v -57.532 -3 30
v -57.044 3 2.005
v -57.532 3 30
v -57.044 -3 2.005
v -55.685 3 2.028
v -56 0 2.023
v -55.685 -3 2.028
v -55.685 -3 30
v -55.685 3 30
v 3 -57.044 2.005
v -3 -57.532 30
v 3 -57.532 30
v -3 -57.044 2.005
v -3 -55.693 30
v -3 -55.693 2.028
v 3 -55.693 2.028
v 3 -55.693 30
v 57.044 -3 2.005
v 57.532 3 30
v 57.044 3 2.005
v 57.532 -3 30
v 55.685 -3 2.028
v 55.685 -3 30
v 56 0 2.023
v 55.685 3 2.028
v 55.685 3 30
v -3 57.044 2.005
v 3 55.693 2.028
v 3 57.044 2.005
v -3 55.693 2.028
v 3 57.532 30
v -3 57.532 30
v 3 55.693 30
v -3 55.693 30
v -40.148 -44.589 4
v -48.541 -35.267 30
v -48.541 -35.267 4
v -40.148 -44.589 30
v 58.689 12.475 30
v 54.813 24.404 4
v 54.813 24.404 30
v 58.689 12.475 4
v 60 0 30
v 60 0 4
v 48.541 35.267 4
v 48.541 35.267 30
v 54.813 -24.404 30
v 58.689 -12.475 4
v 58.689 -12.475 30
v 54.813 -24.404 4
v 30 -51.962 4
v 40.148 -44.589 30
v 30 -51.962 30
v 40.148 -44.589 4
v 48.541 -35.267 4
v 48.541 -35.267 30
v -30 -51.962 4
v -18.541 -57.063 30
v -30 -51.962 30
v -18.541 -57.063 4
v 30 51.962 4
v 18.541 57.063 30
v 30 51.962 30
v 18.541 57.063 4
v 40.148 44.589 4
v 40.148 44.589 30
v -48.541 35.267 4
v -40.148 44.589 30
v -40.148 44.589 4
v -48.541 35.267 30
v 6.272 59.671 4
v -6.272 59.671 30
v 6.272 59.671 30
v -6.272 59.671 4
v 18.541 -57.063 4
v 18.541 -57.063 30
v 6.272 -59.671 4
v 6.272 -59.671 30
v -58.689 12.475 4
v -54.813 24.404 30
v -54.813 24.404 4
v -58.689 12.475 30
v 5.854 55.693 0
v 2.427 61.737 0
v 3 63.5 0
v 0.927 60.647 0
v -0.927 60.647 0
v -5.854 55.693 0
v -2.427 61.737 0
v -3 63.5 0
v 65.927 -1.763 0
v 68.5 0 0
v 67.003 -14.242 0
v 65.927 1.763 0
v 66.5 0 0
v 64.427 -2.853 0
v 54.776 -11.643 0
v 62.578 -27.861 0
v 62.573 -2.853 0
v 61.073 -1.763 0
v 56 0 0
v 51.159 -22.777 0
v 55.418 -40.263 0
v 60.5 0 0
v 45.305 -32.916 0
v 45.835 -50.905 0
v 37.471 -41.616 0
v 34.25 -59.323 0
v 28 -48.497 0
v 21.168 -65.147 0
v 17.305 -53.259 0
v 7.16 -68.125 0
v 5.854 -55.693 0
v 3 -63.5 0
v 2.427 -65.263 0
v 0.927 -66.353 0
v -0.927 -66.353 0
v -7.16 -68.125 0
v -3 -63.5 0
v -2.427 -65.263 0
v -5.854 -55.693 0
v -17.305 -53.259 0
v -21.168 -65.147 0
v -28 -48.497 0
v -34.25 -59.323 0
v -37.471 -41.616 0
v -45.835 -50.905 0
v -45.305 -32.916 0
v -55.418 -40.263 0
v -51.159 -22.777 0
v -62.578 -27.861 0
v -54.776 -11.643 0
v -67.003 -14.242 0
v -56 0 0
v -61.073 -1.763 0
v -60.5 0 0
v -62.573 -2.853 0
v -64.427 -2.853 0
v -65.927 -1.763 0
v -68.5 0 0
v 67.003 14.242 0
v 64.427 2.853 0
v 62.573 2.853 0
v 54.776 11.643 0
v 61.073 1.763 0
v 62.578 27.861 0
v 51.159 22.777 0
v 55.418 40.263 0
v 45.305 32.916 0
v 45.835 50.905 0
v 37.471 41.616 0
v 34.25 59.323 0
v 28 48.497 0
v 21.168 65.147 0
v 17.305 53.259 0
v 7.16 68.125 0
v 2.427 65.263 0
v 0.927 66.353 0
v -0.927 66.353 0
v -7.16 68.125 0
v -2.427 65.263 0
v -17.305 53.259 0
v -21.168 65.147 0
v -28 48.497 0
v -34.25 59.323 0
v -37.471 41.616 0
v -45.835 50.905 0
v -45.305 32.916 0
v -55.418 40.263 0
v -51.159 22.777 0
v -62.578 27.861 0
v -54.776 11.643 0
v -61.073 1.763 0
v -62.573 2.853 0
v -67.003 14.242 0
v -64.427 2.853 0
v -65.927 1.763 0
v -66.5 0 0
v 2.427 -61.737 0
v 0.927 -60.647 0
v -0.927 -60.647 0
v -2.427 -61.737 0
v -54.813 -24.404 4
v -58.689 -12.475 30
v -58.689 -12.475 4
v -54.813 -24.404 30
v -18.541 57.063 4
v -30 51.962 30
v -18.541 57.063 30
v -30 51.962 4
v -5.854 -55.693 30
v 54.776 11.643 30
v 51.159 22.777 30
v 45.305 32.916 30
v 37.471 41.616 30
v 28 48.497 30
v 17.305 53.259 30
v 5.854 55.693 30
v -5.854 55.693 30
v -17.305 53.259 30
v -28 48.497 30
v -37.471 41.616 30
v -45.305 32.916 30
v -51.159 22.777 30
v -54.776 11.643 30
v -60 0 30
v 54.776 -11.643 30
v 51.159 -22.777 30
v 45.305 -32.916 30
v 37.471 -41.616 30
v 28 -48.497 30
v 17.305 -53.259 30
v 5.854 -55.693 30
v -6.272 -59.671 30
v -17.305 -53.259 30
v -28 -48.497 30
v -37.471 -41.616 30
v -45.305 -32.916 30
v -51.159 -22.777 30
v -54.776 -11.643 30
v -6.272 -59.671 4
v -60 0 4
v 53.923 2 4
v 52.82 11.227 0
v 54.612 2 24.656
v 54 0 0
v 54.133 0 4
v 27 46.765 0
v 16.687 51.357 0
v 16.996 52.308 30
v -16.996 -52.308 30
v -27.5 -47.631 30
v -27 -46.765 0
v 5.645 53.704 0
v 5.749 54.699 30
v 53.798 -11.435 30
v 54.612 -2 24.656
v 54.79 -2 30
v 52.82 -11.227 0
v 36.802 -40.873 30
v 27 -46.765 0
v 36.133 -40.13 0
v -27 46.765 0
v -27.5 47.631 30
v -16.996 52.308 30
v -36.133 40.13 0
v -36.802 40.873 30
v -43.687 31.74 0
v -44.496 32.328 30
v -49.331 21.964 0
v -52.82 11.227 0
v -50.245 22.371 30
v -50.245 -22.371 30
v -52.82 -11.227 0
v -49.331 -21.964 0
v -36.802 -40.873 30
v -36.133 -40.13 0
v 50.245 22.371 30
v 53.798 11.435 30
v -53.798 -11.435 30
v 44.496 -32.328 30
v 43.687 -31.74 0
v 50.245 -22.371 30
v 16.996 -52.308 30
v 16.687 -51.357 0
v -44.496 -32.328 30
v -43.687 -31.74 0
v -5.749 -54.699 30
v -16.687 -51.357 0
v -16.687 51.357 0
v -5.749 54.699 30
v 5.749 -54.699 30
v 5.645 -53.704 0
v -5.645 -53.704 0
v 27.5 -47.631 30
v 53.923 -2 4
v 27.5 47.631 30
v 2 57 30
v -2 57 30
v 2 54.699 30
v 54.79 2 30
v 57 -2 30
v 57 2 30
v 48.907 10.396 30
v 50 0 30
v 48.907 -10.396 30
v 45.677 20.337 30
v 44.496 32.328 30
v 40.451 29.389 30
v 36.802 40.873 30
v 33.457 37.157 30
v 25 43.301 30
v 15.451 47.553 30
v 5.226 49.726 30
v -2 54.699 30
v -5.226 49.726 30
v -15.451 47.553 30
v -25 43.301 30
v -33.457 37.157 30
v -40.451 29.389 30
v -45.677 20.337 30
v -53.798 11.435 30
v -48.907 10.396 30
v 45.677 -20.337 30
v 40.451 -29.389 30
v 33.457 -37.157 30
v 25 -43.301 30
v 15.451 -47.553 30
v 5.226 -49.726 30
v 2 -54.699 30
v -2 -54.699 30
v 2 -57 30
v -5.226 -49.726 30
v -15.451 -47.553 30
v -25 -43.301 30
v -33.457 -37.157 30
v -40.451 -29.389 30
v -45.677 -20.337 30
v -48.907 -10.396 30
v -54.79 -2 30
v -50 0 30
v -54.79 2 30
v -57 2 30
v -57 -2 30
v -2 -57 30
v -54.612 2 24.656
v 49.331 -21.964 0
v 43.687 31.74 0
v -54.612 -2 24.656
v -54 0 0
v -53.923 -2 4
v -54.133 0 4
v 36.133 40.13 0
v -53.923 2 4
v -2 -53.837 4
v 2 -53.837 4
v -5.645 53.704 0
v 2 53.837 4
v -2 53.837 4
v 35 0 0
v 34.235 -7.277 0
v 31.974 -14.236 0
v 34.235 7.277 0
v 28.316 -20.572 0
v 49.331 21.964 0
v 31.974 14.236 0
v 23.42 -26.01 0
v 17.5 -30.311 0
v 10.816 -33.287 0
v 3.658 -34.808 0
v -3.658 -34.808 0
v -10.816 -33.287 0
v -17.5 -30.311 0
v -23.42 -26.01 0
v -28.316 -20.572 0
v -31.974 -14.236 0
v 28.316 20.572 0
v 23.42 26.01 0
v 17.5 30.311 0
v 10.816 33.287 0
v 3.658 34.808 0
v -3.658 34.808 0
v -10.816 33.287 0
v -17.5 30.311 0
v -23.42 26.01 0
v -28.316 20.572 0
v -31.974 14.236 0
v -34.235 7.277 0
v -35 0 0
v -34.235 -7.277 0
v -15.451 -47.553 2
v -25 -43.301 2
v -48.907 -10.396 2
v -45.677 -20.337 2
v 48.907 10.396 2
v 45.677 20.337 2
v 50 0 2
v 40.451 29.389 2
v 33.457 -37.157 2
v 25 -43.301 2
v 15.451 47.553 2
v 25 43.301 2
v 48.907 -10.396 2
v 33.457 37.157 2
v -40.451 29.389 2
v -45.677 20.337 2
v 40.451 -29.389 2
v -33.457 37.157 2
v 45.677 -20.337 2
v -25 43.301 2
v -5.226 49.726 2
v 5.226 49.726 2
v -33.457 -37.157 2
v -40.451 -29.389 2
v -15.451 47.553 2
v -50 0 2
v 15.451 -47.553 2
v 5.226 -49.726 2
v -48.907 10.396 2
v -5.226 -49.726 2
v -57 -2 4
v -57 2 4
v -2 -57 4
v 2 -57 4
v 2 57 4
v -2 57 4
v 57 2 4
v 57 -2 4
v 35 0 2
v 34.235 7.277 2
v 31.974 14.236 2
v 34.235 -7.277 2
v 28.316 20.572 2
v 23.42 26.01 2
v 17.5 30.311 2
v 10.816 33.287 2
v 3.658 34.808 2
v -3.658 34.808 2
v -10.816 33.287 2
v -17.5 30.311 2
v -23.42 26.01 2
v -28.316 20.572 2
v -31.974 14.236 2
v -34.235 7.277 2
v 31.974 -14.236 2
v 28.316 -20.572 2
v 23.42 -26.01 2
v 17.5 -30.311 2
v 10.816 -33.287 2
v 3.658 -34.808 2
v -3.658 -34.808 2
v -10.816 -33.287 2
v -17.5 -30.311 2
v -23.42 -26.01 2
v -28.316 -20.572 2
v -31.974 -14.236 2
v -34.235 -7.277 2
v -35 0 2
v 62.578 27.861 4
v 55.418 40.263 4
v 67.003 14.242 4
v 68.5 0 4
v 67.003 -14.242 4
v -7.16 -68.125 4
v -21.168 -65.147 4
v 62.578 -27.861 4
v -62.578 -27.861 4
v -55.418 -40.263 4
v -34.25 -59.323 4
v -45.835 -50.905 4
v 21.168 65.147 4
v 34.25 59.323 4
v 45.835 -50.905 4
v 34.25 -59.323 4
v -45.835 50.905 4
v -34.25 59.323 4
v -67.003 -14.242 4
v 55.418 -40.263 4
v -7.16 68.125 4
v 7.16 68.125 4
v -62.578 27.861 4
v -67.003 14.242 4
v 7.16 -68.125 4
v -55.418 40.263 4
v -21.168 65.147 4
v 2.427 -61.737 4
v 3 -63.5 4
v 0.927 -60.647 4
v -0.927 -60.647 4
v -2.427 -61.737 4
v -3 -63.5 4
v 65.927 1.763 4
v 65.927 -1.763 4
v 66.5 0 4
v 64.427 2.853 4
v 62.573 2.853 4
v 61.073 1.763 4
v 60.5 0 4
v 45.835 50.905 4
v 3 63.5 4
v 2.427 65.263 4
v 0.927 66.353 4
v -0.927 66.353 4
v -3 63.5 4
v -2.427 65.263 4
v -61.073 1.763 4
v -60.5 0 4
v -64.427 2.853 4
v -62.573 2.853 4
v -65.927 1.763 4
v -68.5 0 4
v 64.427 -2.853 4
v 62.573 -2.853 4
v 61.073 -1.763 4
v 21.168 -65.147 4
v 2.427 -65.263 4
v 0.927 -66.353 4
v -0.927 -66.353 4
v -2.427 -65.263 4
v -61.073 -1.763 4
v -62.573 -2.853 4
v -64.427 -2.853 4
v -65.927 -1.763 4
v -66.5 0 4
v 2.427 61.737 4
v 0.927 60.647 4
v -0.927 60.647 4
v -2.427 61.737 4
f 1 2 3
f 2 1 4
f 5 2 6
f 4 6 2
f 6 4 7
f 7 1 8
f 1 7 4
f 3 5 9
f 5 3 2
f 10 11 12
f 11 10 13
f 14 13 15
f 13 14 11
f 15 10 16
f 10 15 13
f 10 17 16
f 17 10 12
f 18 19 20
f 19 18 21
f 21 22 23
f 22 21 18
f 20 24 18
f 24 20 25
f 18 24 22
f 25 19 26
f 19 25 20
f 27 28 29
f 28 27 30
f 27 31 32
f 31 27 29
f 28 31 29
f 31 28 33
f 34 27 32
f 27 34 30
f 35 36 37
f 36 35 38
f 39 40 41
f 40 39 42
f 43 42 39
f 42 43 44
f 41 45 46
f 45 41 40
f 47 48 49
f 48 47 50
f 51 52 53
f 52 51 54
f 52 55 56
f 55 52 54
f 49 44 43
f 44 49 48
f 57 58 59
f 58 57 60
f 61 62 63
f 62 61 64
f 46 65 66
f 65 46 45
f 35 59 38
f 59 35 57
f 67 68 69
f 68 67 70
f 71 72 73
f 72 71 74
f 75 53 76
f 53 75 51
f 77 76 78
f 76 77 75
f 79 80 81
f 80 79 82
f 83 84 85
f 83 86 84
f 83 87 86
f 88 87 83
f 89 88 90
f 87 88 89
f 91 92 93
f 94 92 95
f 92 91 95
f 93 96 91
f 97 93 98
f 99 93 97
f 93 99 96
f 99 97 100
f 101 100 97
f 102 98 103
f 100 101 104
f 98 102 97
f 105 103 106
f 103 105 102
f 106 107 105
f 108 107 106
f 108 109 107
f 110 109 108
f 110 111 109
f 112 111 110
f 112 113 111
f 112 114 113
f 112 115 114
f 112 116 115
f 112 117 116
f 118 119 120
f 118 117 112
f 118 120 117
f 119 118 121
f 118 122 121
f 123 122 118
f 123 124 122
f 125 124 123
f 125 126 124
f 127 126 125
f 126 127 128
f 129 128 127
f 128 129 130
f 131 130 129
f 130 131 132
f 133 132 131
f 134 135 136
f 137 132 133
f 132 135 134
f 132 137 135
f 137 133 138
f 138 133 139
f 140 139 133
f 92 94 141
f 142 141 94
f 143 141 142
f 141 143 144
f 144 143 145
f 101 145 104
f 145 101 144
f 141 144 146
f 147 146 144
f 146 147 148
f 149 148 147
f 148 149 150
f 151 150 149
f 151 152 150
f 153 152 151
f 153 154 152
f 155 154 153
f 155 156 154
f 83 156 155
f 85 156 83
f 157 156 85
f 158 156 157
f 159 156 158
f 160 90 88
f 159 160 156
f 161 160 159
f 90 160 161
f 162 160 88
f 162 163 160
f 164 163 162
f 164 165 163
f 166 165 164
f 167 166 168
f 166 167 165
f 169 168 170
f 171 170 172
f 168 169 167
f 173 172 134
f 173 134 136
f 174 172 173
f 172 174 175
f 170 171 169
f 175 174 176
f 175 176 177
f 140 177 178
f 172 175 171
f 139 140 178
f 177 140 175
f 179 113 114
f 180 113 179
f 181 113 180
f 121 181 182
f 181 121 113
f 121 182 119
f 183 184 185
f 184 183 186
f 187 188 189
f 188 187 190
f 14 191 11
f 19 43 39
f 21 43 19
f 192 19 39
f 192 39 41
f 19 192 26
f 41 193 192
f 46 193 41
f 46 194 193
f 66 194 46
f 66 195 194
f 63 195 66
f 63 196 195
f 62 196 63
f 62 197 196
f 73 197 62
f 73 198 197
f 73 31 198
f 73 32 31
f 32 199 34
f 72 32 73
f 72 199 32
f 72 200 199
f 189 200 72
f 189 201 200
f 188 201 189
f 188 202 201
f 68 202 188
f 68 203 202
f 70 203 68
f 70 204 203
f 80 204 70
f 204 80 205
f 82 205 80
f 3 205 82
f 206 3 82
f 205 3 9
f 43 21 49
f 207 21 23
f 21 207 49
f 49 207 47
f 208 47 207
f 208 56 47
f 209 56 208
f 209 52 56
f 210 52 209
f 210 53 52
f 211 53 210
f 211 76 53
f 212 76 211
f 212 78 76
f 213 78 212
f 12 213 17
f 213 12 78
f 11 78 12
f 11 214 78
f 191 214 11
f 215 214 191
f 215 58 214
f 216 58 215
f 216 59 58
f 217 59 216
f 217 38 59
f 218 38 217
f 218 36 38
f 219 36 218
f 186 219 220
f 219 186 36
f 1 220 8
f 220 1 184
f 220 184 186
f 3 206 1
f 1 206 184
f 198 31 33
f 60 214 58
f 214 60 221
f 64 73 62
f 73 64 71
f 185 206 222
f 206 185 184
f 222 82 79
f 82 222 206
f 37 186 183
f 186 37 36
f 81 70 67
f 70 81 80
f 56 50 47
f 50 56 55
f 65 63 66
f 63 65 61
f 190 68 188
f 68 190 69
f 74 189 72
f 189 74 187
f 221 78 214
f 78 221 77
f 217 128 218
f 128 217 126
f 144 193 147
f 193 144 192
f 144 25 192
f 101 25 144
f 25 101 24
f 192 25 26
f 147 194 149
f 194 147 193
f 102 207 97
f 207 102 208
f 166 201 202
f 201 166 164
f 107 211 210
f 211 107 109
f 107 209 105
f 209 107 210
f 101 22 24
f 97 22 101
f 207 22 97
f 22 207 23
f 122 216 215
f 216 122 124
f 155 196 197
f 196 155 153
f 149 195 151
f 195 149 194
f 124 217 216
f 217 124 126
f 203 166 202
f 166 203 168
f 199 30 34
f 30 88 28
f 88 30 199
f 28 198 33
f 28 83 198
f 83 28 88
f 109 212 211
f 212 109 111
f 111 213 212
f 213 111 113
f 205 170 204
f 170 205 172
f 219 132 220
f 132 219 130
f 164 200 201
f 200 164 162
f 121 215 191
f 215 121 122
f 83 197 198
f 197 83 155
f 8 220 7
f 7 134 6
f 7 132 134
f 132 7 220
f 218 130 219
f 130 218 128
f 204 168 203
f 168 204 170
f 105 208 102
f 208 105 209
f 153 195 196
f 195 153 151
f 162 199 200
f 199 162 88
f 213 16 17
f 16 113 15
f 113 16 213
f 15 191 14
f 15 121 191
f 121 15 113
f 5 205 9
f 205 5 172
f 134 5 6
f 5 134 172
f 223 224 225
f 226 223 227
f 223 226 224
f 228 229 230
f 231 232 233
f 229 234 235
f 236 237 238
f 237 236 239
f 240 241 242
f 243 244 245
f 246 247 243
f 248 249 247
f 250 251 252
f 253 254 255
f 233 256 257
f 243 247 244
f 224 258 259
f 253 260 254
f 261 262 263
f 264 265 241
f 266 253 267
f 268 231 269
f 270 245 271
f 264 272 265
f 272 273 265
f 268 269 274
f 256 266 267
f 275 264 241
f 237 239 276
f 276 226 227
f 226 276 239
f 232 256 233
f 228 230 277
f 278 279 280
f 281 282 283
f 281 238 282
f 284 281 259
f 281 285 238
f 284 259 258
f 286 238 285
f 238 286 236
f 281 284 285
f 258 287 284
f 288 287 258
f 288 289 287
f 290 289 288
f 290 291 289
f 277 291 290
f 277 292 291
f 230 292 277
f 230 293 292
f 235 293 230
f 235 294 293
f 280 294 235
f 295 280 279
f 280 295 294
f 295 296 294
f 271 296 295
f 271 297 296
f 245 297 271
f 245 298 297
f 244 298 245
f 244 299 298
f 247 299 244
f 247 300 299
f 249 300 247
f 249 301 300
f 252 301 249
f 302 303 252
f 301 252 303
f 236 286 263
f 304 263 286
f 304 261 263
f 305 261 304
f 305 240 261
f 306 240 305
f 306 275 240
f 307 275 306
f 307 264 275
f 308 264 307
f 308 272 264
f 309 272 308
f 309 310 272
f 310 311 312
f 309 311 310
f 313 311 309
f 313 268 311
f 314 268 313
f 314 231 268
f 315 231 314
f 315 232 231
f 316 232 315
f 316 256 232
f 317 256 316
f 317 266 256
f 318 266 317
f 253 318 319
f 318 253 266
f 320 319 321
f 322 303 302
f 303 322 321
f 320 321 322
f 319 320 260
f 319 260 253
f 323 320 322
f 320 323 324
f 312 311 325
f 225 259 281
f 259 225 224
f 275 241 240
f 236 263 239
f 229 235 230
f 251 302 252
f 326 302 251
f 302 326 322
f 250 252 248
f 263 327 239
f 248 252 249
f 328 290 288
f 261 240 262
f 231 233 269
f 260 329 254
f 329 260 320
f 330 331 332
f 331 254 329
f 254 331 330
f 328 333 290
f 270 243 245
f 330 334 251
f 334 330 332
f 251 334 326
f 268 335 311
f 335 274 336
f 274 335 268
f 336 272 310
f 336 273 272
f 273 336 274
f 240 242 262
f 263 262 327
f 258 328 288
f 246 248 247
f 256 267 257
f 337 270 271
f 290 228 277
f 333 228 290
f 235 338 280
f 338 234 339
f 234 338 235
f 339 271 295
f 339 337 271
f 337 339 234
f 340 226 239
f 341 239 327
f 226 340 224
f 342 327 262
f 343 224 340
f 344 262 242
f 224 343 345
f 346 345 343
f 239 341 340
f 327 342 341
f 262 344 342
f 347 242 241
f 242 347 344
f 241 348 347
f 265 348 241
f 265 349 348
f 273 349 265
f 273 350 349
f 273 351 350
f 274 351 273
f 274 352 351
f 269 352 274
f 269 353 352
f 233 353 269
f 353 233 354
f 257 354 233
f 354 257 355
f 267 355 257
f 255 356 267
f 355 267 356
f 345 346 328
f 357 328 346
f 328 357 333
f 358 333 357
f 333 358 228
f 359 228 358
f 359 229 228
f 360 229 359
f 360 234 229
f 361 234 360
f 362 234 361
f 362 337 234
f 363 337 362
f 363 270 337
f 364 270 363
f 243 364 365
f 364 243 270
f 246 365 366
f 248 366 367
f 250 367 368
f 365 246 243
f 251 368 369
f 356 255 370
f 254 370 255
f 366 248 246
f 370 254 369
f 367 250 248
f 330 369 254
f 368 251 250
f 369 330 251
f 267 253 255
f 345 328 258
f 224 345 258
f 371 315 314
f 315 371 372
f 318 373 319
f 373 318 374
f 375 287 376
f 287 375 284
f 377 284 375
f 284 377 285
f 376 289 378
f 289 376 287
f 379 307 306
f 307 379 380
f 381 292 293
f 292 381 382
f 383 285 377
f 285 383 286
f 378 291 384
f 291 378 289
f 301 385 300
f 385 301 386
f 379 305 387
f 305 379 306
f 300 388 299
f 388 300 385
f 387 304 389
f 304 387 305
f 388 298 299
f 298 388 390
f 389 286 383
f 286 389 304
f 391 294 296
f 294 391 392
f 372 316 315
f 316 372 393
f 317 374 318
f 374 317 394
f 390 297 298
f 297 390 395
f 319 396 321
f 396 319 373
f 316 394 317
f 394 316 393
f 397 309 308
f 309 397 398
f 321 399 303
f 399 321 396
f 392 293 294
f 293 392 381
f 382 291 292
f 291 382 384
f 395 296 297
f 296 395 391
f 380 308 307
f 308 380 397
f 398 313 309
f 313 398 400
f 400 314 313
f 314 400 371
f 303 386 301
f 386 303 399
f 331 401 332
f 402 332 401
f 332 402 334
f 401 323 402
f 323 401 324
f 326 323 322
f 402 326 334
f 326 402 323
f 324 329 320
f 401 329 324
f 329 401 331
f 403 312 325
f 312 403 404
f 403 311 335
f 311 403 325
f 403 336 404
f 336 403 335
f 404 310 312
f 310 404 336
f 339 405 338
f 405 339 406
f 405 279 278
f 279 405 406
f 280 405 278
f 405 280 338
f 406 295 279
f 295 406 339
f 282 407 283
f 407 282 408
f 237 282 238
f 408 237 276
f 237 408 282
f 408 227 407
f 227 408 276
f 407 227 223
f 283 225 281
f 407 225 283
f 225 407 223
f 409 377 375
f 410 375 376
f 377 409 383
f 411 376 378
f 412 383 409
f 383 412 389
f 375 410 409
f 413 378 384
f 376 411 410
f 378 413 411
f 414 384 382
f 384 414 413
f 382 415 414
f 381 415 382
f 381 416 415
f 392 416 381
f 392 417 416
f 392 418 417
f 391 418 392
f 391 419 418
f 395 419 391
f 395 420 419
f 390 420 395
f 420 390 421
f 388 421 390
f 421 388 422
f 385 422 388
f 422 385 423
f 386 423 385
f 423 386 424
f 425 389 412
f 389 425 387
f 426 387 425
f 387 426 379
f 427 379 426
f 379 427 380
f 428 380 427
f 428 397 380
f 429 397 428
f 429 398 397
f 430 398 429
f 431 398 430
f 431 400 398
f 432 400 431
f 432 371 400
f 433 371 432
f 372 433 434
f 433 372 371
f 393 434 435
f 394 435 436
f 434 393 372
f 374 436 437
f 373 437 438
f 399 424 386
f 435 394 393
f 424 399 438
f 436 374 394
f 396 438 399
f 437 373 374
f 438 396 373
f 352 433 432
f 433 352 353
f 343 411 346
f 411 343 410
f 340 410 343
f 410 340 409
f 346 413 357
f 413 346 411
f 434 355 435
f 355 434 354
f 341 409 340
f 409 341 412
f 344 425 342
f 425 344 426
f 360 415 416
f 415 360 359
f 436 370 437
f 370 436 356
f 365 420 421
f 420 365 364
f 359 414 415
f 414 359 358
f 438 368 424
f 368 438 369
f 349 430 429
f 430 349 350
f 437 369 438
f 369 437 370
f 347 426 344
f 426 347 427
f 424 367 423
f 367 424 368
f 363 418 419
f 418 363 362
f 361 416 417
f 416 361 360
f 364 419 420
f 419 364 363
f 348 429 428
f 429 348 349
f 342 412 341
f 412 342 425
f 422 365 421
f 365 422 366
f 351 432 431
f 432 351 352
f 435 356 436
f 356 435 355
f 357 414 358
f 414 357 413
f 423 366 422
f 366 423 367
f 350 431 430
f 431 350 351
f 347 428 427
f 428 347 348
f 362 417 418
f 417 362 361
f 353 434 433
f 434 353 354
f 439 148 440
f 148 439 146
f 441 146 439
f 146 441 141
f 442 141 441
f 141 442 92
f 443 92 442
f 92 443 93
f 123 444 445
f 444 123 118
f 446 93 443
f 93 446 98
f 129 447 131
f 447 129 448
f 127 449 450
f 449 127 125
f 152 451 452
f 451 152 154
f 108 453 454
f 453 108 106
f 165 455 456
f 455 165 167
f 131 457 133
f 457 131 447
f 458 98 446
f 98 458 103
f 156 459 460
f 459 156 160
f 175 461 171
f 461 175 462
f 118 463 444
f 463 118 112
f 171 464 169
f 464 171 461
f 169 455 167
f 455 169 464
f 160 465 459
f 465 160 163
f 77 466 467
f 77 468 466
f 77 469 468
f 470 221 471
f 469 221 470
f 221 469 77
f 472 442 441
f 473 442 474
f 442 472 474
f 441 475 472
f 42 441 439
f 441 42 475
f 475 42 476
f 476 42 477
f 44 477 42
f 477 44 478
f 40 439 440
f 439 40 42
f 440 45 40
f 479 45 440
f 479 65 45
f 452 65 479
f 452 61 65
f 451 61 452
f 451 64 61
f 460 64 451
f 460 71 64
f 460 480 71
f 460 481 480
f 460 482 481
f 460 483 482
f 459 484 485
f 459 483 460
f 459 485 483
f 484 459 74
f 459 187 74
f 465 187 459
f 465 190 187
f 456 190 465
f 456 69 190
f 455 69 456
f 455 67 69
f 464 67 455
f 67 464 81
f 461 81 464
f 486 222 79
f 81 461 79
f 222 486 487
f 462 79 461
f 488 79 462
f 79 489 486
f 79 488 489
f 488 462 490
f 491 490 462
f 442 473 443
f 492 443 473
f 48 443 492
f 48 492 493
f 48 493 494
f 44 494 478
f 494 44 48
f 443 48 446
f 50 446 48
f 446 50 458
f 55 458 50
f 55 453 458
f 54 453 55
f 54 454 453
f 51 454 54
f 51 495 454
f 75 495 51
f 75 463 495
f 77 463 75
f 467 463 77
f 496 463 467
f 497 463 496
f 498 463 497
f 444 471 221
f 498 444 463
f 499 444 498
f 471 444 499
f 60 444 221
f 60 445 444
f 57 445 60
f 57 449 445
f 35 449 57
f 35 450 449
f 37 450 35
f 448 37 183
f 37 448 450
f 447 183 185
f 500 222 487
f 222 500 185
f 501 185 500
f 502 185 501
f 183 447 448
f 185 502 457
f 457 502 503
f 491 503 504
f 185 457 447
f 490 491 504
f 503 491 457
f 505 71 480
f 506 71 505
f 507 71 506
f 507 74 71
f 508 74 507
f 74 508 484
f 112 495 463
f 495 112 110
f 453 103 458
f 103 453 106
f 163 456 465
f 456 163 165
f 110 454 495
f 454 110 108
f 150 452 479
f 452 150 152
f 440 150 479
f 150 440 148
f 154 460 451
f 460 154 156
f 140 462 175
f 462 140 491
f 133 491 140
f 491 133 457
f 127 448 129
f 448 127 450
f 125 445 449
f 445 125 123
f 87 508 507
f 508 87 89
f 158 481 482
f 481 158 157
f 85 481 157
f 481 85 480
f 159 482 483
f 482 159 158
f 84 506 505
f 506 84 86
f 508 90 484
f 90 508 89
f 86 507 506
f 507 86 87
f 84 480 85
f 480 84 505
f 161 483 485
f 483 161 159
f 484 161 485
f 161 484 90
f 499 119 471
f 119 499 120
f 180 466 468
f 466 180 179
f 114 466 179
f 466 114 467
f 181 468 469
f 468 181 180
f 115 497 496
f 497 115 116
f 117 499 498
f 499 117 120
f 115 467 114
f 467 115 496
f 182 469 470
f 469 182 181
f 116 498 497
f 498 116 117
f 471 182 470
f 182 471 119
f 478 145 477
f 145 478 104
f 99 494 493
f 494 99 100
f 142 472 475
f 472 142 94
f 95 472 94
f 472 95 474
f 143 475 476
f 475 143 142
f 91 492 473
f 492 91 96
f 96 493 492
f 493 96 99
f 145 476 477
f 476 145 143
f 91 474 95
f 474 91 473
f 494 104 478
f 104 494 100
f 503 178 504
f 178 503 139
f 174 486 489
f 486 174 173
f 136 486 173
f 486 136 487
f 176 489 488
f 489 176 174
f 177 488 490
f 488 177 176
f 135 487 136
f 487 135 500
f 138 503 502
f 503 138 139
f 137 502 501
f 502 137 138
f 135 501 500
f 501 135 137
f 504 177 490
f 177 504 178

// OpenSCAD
module innerTube(radius,height) {
	difference() {
		cylinder(height,radius,radius);
		translate([0,0,-1]) cylinder(height+2,radius-4,radius-4);
		for (i=[0:3]) {
			rotate([0,-1,i*90])translate([0-(radius-3),-3,3]) color([1,0,0,1])cube([4,6,height]);
		}
	}
}
module peggedTube(radius,height) {
	union() {
		innerTube(radius,height);
		rotate([0,0,0]) translate([0-(radius+2),-2,height-8]) cube([3,4,4]);
		rotate([0,0,90]) translate([0-(radius+2),-2,height-8]) cube([3,4,4]);
		rotate([0,0,-90]) translate([0-(radius+2),-2,height-8]) cube([3,4,4]);
		rotate([0,0,180]) translate([0-(radius+2),-2,height-8]) cube([3,4,4]);
	}
}
module centerTube(radius,height) {
	union() {
		difference() {
			cylinder(height,radius-1,radius);
			translate([0,0,-1]) cylinder(height+2,radius-5,radius-5);
		}
		rotate([0,0,0]) translate([0-(radius+2),-2,4]) cube([4,4,height-4]);
		rotate([0,0,90]) translate([0-(radius+2),-2,4]) cube([4,4,height-4]);
		rotate([0,0,-90]) translate([0-(radius+2),-2,4]) cube([4,4,height-4]);
		rotate([0,0,180]) translate([0-(radius+2),-2,4]) cube([4,4,height-4]);
	}
}
module tube(tubeOuterRadius,tubeHeight,tubeCount,extend) {
	union() {
		innerTube(tubeOuterRadius,tubeHeight);
		if (tubeCount > 2) {
			for (i=[1:tubeCount-2]) {
				translate([0,0,extend*(0-i*(tubeHeight-12))]) rotate([0,0,(i%2)*90]) peggedTube(tubeOuterRadius-i*5,tubeHeight);
			}
		}
		if (tubeCount > 1) {
			translate([0,0,extend*(0-(tubeCount-1)*(tubeHeight-12))])  centerTube(tubeOuterRadius-(tubeCount-1)*5,tubeHeight);
		}
	}
}
//difference() {
	tube(60/d,30,2,0);
//	translate([0,0,-1]) cube([40,40,92]);
//}

difference() {
	cylinder(2,51/d,51/d);
	translate([0,0,-5]) cylinder(10,35/d,35/d);
}




d=1;
// koppeling draad
inner_hole = 35;
/*
difference() {
	cylinder(2,51/d,51/d);
	translate([0,0,-2]) cylinder(10,35/d,35/d);

}
*/

rad = 63.5/d;
difference() {
	cylinder(4,68.5/d,68.5/d);
	translate([0,0,-2]) cylinder(10,59/d,59/d);
	
	translate([0,rad,-2]) cylinder(10,3/d,3/d);
	translate([0,-rad,-2]) cylinder(10,3/d,3/d);
	translate([rad,0,-2]) cylinder(10,3/d,3/d);
	translate([-rad,0,-2]) cylinder(10,3/d,3/d);
}
